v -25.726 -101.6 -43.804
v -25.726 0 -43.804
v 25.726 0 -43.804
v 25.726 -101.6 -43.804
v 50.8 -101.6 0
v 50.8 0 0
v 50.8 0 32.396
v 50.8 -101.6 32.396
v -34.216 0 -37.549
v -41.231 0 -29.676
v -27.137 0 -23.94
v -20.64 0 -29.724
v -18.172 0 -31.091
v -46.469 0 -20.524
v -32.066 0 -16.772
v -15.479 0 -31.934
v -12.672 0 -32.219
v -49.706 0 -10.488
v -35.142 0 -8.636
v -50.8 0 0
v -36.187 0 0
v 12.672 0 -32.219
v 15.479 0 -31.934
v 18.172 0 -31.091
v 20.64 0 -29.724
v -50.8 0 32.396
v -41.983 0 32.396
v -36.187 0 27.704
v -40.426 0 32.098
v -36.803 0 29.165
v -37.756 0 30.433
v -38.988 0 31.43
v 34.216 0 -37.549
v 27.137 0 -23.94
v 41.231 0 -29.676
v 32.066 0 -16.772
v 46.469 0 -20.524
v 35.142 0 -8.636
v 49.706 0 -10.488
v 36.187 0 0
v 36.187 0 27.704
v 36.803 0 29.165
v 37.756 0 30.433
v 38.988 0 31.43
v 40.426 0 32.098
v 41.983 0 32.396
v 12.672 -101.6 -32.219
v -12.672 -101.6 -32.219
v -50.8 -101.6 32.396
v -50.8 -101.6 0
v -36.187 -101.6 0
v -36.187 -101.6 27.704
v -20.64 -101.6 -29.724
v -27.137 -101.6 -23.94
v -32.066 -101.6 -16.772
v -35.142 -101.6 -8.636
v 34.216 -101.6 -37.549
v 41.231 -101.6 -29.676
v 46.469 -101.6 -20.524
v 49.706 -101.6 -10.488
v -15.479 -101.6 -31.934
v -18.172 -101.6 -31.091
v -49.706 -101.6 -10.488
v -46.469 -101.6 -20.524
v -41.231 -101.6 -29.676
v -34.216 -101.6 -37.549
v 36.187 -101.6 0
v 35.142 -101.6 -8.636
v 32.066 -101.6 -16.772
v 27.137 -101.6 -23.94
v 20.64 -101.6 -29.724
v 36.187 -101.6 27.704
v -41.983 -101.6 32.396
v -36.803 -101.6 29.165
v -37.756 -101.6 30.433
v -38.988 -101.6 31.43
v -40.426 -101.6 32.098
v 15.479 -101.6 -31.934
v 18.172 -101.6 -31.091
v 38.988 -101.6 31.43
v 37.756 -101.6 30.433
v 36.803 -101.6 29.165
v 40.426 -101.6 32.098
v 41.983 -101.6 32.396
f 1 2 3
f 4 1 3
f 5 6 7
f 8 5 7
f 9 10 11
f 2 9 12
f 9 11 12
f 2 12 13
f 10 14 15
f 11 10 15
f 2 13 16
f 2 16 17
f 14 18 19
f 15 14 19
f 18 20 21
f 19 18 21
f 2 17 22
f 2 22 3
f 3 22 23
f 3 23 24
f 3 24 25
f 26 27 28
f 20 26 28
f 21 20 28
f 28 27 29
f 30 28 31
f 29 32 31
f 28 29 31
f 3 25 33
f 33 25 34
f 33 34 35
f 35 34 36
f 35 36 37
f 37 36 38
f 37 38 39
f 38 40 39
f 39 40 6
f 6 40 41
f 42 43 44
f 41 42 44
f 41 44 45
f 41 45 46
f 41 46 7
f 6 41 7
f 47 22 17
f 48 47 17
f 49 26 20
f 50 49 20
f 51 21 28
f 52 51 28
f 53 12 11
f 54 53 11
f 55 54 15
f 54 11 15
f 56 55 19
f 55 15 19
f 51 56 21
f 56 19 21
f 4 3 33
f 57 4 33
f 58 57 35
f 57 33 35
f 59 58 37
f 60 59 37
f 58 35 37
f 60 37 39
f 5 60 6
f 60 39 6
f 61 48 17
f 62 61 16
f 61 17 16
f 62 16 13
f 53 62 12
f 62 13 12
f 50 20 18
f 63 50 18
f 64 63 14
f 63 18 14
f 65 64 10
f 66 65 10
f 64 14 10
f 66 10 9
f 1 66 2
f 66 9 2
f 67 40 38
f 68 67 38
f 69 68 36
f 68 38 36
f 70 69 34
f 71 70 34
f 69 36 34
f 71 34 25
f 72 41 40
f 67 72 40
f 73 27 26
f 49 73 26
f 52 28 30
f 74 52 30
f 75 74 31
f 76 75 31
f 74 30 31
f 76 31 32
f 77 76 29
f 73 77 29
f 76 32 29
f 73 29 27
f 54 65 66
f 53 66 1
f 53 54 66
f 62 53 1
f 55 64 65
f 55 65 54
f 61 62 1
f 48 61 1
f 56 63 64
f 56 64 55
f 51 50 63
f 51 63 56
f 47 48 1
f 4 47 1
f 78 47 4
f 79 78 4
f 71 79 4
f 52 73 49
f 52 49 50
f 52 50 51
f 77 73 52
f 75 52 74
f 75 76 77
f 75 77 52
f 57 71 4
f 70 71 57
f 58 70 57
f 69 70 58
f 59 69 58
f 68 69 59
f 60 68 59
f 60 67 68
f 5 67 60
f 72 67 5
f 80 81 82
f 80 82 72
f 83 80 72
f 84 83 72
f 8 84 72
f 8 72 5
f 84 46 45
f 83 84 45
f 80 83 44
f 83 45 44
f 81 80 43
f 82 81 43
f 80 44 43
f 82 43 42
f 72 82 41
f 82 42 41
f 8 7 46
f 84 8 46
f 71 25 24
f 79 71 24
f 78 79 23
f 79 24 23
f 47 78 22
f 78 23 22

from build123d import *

# Parameters (mm, degrees)
F1_DEPTH = 101.6


with BuildPart() as f1:
    # F0 (on Front) → F1 (new body)
    with BuildSketch(Plane.XZ):
        with BuildLine():
            ThreePointArc((-20.63977, -29.72378), (-32.065525, -16.772159), (-36.187058, 0))
            Line((-36.187058, 0), (-36.187058, 27.704396))
            ThreePointArc((-36.187058, 27.704396), (-38.341088, 30.969492), (-41.983402, 32.395763))
            Line((-41.983402, 32.395763), (-50.8, 32.395763))
            Line((-50.8, 32.395763), (-50.8, 0))
            ThreePointArc((-50.8, 0), (-44.088108, -25.236456), (-25.726035, -43.804237))
            Line((-25.726035, -43.804237), (0, -43.804237))
            Line((0, -43.804237), (25.726035, -43.804237))
            ThreePointArc((25.726035, -43.804237), (44.088108, -25.236456), (50.8, 0))
            Line((50.8, 0), (50.8, 32.395763))
            Line((50.8, 32.395763), (41.983402, 32.395763))
            ThreePointArc((41.983402, 32.395763), (38.341088, 30.969492), (36.187058, 27.704396))
            Line((36.187058, 27.704396), (36.187058, 0))
            ThreePointArc((36.187058, 0), (32.065525, -16.772159), (20.63977, -29.72378))
            ThreePointArc((20.63977, -29.72378), (16.846551, -31.580554), (12.671795, -32.218926))
            Line((12.671795, -32.218926), (0, -32.218926))
            Line((0, -32.218926), (-12.671795, -32.218926))
            ThreePointArc((-12.671795, -32.218926), (-16.846551, -31.580554), (-20.63977, -29.72378))
        make_face()
    extrude(amount=F1_DEPTH)


solid = f1.part
